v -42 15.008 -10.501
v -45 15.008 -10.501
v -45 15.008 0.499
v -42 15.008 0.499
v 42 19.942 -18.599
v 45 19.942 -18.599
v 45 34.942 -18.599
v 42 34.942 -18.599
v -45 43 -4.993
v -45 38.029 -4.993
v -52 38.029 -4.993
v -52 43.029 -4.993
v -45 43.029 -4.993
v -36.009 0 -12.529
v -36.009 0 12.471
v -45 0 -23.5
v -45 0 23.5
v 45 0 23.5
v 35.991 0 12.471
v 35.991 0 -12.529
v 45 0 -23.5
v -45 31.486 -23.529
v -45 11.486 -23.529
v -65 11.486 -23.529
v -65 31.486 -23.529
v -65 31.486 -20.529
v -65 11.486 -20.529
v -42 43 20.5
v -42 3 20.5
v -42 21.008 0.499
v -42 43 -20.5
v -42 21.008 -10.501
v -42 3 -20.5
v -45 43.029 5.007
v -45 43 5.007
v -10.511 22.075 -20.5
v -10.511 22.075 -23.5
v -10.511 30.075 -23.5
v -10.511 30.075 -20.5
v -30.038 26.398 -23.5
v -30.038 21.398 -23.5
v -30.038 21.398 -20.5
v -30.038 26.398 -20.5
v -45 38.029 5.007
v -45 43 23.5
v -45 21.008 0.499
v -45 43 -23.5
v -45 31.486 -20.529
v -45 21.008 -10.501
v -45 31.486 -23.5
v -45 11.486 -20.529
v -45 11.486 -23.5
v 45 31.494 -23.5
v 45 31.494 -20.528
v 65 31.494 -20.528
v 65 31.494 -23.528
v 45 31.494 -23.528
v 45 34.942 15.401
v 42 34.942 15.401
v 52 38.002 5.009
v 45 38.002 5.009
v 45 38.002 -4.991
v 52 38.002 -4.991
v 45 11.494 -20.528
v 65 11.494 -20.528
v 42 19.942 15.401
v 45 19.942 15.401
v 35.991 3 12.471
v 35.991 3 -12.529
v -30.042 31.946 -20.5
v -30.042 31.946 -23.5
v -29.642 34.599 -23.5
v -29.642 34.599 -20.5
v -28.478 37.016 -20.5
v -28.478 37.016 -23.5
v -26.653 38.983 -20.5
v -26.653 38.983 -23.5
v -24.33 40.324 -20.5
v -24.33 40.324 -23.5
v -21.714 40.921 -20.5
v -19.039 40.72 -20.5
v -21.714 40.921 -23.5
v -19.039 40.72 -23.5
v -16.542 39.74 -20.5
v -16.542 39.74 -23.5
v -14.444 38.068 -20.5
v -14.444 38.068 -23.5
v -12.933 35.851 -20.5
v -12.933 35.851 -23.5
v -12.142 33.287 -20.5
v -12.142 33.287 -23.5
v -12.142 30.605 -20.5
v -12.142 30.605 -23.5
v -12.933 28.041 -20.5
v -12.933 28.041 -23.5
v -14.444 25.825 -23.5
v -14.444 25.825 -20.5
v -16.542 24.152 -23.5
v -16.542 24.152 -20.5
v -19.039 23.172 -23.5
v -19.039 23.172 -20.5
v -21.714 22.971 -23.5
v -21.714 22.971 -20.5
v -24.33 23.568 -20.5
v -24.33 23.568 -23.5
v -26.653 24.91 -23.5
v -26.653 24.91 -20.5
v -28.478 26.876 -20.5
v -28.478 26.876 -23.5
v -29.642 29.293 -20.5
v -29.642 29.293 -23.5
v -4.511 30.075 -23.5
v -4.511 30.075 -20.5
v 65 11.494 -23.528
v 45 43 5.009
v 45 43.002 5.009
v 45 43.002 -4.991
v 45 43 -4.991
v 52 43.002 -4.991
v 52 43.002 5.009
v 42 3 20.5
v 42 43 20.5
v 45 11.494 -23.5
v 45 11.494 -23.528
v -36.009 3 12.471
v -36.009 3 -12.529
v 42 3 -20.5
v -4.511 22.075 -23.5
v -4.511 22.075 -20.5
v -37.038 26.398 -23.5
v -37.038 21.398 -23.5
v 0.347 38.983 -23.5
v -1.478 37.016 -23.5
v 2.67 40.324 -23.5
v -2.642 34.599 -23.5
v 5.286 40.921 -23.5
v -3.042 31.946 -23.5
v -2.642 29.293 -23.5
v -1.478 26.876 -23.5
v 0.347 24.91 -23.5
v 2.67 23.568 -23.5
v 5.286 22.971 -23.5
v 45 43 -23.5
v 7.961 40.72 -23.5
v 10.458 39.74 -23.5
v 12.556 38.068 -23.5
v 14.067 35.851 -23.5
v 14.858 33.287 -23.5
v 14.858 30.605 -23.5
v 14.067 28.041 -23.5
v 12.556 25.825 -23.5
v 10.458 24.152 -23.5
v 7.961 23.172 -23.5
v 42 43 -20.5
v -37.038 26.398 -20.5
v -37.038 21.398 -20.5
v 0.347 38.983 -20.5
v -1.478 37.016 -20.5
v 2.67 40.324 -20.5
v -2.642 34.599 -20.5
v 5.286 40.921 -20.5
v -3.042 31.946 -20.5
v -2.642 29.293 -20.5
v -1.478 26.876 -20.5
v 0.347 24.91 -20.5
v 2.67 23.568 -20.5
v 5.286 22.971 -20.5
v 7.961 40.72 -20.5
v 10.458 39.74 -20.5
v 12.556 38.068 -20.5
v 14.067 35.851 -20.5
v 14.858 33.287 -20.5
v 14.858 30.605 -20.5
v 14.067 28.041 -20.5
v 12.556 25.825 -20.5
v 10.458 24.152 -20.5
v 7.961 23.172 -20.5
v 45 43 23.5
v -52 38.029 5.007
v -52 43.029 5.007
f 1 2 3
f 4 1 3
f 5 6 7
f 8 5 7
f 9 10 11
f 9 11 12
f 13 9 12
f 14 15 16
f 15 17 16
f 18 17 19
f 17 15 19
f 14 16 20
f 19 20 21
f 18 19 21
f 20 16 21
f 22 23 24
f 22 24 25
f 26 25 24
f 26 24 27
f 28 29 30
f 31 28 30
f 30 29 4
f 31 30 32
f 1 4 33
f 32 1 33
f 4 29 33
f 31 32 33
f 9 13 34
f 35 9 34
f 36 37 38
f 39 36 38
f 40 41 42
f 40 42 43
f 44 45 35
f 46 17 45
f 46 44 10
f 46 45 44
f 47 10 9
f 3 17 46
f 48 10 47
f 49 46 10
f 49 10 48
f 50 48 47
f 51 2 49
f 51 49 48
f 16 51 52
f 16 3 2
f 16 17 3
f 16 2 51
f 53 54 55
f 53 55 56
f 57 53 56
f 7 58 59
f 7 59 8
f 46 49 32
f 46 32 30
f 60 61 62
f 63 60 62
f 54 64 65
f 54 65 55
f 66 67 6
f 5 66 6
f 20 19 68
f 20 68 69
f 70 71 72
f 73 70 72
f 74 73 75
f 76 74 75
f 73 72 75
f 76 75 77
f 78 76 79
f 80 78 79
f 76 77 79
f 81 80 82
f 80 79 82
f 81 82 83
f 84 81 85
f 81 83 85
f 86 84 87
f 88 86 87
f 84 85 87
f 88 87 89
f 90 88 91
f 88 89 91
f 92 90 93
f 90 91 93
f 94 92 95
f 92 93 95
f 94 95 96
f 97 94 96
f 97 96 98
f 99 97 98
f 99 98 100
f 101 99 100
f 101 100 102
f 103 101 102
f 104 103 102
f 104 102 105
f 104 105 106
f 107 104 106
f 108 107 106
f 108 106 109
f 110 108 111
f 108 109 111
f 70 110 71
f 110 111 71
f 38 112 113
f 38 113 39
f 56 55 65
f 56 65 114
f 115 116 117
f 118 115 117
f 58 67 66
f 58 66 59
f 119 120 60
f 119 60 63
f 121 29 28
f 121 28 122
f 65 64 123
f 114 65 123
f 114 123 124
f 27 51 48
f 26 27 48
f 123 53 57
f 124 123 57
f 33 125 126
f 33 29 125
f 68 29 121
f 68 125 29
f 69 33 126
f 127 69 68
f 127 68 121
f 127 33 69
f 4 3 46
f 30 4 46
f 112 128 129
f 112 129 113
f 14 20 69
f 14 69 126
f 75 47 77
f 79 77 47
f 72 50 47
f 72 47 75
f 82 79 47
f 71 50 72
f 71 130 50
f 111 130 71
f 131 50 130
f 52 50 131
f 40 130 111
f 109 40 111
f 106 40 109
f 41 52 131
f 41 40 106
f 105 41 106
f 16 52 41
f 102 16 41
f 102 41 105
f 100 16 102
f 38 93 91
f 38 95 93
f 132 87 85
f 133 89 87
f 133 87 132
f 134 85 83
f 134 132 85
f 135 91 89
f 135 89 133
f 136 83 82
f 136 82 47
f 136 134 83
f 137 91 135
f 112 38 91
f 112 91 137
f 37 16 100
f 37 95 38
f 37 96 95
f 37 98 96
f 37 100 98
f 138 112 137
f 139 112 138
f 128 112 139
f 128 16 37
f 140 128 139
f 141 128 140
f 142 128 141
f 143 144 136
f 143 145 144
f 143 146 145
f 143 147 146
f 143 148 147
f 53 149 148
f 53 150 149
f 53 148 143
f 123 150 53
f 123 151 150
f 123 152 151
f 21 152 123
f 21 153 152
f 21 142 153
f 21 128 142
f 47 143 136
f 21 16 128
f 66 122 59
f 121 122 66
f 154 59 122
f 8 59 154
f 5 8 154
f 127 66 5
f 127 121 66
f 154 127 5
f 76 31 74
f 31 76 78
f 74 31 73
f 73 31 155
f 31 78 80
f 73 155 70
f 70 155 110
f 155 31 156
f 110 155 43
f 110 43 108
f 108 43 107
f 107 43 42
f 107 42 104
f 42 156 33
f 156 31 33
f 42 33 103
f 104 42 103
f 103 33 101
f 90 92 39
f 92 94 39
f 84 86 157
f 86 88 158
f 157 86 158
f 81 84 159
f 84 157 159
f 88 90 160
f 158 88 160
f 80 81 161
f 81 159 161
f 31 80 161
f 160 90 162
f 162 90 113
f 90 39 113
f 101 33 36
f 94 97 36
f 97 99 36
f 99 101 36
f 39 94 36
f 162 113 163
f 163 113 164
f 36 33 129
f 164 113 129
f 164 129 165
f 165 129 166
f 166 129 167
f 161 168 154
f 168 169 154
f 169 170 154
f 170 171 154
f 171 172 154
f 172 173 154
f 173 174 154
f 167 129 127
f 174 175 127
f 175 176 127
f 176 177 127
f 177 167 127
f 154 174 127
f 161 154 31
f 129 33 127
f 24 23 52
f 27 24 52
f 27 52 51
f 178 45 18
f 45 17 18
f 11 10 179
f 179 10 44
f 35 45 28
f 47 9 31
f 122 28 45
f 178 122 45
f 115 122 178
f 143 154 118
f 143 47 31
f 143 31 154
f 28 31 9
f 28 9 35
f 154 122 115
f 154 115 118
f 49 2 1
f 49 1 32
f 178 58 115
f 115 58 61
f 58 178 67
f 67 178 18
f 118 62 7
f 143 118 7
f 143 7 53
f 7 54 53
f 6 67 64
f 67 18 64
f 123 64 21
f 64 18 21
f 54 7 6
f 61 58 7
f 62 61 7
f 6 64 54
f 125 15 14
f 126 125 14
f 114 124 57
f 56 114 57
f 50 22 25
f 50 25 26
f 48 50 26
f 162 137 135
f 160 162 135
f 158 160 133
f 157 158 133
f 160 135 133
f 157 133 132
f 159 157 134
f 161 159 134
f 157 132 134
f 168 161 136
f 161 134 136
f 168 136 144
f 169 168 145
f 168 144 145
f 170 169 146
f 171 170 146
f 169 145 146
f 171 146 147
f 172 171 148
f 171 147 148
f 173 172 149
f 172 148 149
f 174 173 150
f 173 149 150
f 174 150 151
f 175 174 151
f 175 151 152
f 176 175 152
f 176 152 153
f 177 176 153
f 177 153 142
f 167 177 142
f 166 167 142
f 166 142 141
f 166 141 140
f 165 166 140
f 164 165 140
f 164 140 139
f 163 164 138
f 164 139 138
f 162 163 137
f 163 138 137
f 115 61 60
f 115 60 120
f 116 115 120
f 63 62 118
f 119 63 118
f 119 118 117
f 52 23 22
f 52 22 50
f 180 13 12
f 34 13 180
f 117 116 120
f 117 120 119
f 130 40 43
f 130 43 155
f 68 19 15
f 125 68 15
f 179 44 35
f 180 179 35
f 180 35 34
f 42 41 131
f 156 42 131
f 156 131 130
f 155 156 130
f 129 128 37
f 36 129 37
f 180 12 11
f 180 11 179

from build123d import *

# Parameters (mm, degrees)
CROQUIS1_W              = 90
CROQUIS1_H              = 47
SALIENTE_EXTRUIR1_DEPTH = 3
CROQUIS2_W              = 90
CROQUIS2_H              = 47
CROQUIS2_W_2            = 84
CROQUIS2_H_2            = 41
SALIENTE_EXTRUIR2_DEPTH = 40
CROQUIS6_W              = 72
CROQUIS6_H              = 25
CORTAR_EXTRUIR5_DEPTH   = 3
CROQUIS8_W              = 34
CROQUIS8_H              = 15
CORTAR_EXTRUIR6_DEPTH   = 3
CROQUIS9_W              = 9.999999999
CROQUIS9_H              = 5
SALIENTE_EXTRUIR3_DEPTH = 7
CROQUIS10_W             = 3
CROQUIS10_H             = 20
SALIENTE_EXTRUIR4_DEPTH = 20
CROQUIS12_W             = 3
CROQUIS12_H             = 20
SALIENTE_EXTRUIR5_DEPTH = 20
CROQUIS13_W             = 10
CROQUIS13_H             = 5
SALIENTE_EXTRUIR6_DEPTH = 7
CROQUIS14_W             = 11
CROQUIS14_H             = 6
CORTAR_EXTRUIR8_DEPTH   = 3
CROQUIS15_R             = 9
CROQUIS15_W             = 7
CROQUIS15_H             = 5
CROQUIS15_W_2           = 6
CROQUIS15_H_2           = 8
CORTAR_EXTRUIR9_DEPTH   = 3


with BuildPart() as part:
    # Croquis1 → Saliente-Extruir1 (new body)
    with BuildSketch(Plane(origin=(0, 0, 0), x_dir=(1, 0, 0), z_dir=(0, 1, 0))):
        Rectangle(CROQUIS1_W, CROQUIS1_H)
    extrude(amount=SALIENTE_EXTRUIR1_DEPTH)

    # Croquis2 → Saliente-Extruir2 (add)
    with BuildSketch(Plane(origin=(0, 3, 0), x_dir=(1, 0, 0), z_dir=(0, 1, 0))):
        Rectangle(CROQUIS2_W, CROQUIS2_H)
        Rectangle(CROQUIS2_W_2, CROQUIS2_H_2, mode=Mode.SUBTRACT)
    extrude(amount=SALIENTE_EXTRUIR2_DEPTH)

    # Croquis6 → Cortar-Extruir5 (cut)
    with BuildSketch(Plane(origin=(0, 0, 0), x_dir=(-1, 0, 0), z_dir=(0, -1, 0))):
        with Locations((0.009067855, 0.029457722)):
            Rectangle(CROQUIS6_W, CROQUIS6_H)
    extrude(amount=-CORTAR_EXTRUIR5_DEPTH, mode=Mode.SUBTRACT)

    # Croquis8 → Cortar-Extruir6 (cut)
    with BuildSketch(Plane(origin=(45, 0, 0), x_dir=(0, 0, -1), z_dir=(1, 0, 0))):
        with Locations((1.598714356, 27.442281593)):
            Rectangle(CROQUIS8_W, CROQUIS8_H)
    extrude(amount=-CORTAR_EXTRUIR6_DEPTH, mode=Mode.SUBTRACT)

    # Croquis9 → Saliente-Extruir3 (add)
    with BuildSketch(Plane(origin=(45, 0, 0), x_dir=(0, 0, -1), z_dir=(1, 0, 0))):
        with Locations((-0.008616077, 40.502224836)):
            Rectangle(CROQUIS9_W, CROQUIS9_H)
    extrude(amount=SALIENTE_EXTRUIR3_DEPTH)

    # Croquis10 → Saliente-Extruir4 (add)
    with BuildSketch(Plane(origin=(45, 0, 0), x_dir=(0, 0, -1), z_dir=(1, 0, 0))):
        with Locations((22.028285353, 21.493620383)):
            Rectangle(CROQUIS10_W, CROQUIS10_H)
    extrude(amount=SALIENTE_EXTRUIR4_DEPTH)

    # Croquis12 → Saliente-Extruir5 (add)
    with BuildSketch(Plane.ZY.offset(45)):
        with Locations((-22.029401758, 21.485642244)):
            Rectangle(CROQUIS12_W, CROQUIS12_H)
    extrude(amount=SALIENTE_EXTRUIR5_DEPTH)

    # Croquis13 → Saliente-Extruir6 (add)
    with BuildSketch(Plane.ZY.offset(45)):
        with Locations((0.007263923, 40.528739096)):
            Rectangle(CROQUIS13_W, CROQUIS13_H)
    extrude(amount=SALIENTE_EXTRUIR6_DEPTH)

    # Croquis14 → Cortar-Extruir8 (cut)
    with BuildSketch(Plane.ZY.offset(45)):
        with Locations((-5.001075708, 18.007541224)):
            Rectangle(CROQUIS14_W, CROQUIS14_H)
    extrude(amount=-CORTAR_EXTRUIR8_DEPTH, mode=Mode.SUBTRACT)

    # Croquis15 → Cortar-Extruir9 (cut)
    with BuildSketch(Plane(origin=(0, 0, -23.5), x_dir=(-1, 0, 0), z_dir=(0, 0, -1))):
        with Locations((-5.958347551, 31.946109842)):
            Circle(CROQUIS15_R)
        with Locations((21.041652448, 31.946109842)):
            Circle(CROQUIS15_R)
        with Locations((33.5380591, 23.898149155)):
            Rectangle(CROQUIS15_W, CROQUIS15_H)
        with Locations((7.510757726, 26.075310147)):
            Rectangle(CROQUIS15_W_2, CROQUIS15_H_2)
    extrude(amount=-CORTAR_EXTRUIR9_DEPTH, mode=Mode.SUBTRACT)


solid = part.part
